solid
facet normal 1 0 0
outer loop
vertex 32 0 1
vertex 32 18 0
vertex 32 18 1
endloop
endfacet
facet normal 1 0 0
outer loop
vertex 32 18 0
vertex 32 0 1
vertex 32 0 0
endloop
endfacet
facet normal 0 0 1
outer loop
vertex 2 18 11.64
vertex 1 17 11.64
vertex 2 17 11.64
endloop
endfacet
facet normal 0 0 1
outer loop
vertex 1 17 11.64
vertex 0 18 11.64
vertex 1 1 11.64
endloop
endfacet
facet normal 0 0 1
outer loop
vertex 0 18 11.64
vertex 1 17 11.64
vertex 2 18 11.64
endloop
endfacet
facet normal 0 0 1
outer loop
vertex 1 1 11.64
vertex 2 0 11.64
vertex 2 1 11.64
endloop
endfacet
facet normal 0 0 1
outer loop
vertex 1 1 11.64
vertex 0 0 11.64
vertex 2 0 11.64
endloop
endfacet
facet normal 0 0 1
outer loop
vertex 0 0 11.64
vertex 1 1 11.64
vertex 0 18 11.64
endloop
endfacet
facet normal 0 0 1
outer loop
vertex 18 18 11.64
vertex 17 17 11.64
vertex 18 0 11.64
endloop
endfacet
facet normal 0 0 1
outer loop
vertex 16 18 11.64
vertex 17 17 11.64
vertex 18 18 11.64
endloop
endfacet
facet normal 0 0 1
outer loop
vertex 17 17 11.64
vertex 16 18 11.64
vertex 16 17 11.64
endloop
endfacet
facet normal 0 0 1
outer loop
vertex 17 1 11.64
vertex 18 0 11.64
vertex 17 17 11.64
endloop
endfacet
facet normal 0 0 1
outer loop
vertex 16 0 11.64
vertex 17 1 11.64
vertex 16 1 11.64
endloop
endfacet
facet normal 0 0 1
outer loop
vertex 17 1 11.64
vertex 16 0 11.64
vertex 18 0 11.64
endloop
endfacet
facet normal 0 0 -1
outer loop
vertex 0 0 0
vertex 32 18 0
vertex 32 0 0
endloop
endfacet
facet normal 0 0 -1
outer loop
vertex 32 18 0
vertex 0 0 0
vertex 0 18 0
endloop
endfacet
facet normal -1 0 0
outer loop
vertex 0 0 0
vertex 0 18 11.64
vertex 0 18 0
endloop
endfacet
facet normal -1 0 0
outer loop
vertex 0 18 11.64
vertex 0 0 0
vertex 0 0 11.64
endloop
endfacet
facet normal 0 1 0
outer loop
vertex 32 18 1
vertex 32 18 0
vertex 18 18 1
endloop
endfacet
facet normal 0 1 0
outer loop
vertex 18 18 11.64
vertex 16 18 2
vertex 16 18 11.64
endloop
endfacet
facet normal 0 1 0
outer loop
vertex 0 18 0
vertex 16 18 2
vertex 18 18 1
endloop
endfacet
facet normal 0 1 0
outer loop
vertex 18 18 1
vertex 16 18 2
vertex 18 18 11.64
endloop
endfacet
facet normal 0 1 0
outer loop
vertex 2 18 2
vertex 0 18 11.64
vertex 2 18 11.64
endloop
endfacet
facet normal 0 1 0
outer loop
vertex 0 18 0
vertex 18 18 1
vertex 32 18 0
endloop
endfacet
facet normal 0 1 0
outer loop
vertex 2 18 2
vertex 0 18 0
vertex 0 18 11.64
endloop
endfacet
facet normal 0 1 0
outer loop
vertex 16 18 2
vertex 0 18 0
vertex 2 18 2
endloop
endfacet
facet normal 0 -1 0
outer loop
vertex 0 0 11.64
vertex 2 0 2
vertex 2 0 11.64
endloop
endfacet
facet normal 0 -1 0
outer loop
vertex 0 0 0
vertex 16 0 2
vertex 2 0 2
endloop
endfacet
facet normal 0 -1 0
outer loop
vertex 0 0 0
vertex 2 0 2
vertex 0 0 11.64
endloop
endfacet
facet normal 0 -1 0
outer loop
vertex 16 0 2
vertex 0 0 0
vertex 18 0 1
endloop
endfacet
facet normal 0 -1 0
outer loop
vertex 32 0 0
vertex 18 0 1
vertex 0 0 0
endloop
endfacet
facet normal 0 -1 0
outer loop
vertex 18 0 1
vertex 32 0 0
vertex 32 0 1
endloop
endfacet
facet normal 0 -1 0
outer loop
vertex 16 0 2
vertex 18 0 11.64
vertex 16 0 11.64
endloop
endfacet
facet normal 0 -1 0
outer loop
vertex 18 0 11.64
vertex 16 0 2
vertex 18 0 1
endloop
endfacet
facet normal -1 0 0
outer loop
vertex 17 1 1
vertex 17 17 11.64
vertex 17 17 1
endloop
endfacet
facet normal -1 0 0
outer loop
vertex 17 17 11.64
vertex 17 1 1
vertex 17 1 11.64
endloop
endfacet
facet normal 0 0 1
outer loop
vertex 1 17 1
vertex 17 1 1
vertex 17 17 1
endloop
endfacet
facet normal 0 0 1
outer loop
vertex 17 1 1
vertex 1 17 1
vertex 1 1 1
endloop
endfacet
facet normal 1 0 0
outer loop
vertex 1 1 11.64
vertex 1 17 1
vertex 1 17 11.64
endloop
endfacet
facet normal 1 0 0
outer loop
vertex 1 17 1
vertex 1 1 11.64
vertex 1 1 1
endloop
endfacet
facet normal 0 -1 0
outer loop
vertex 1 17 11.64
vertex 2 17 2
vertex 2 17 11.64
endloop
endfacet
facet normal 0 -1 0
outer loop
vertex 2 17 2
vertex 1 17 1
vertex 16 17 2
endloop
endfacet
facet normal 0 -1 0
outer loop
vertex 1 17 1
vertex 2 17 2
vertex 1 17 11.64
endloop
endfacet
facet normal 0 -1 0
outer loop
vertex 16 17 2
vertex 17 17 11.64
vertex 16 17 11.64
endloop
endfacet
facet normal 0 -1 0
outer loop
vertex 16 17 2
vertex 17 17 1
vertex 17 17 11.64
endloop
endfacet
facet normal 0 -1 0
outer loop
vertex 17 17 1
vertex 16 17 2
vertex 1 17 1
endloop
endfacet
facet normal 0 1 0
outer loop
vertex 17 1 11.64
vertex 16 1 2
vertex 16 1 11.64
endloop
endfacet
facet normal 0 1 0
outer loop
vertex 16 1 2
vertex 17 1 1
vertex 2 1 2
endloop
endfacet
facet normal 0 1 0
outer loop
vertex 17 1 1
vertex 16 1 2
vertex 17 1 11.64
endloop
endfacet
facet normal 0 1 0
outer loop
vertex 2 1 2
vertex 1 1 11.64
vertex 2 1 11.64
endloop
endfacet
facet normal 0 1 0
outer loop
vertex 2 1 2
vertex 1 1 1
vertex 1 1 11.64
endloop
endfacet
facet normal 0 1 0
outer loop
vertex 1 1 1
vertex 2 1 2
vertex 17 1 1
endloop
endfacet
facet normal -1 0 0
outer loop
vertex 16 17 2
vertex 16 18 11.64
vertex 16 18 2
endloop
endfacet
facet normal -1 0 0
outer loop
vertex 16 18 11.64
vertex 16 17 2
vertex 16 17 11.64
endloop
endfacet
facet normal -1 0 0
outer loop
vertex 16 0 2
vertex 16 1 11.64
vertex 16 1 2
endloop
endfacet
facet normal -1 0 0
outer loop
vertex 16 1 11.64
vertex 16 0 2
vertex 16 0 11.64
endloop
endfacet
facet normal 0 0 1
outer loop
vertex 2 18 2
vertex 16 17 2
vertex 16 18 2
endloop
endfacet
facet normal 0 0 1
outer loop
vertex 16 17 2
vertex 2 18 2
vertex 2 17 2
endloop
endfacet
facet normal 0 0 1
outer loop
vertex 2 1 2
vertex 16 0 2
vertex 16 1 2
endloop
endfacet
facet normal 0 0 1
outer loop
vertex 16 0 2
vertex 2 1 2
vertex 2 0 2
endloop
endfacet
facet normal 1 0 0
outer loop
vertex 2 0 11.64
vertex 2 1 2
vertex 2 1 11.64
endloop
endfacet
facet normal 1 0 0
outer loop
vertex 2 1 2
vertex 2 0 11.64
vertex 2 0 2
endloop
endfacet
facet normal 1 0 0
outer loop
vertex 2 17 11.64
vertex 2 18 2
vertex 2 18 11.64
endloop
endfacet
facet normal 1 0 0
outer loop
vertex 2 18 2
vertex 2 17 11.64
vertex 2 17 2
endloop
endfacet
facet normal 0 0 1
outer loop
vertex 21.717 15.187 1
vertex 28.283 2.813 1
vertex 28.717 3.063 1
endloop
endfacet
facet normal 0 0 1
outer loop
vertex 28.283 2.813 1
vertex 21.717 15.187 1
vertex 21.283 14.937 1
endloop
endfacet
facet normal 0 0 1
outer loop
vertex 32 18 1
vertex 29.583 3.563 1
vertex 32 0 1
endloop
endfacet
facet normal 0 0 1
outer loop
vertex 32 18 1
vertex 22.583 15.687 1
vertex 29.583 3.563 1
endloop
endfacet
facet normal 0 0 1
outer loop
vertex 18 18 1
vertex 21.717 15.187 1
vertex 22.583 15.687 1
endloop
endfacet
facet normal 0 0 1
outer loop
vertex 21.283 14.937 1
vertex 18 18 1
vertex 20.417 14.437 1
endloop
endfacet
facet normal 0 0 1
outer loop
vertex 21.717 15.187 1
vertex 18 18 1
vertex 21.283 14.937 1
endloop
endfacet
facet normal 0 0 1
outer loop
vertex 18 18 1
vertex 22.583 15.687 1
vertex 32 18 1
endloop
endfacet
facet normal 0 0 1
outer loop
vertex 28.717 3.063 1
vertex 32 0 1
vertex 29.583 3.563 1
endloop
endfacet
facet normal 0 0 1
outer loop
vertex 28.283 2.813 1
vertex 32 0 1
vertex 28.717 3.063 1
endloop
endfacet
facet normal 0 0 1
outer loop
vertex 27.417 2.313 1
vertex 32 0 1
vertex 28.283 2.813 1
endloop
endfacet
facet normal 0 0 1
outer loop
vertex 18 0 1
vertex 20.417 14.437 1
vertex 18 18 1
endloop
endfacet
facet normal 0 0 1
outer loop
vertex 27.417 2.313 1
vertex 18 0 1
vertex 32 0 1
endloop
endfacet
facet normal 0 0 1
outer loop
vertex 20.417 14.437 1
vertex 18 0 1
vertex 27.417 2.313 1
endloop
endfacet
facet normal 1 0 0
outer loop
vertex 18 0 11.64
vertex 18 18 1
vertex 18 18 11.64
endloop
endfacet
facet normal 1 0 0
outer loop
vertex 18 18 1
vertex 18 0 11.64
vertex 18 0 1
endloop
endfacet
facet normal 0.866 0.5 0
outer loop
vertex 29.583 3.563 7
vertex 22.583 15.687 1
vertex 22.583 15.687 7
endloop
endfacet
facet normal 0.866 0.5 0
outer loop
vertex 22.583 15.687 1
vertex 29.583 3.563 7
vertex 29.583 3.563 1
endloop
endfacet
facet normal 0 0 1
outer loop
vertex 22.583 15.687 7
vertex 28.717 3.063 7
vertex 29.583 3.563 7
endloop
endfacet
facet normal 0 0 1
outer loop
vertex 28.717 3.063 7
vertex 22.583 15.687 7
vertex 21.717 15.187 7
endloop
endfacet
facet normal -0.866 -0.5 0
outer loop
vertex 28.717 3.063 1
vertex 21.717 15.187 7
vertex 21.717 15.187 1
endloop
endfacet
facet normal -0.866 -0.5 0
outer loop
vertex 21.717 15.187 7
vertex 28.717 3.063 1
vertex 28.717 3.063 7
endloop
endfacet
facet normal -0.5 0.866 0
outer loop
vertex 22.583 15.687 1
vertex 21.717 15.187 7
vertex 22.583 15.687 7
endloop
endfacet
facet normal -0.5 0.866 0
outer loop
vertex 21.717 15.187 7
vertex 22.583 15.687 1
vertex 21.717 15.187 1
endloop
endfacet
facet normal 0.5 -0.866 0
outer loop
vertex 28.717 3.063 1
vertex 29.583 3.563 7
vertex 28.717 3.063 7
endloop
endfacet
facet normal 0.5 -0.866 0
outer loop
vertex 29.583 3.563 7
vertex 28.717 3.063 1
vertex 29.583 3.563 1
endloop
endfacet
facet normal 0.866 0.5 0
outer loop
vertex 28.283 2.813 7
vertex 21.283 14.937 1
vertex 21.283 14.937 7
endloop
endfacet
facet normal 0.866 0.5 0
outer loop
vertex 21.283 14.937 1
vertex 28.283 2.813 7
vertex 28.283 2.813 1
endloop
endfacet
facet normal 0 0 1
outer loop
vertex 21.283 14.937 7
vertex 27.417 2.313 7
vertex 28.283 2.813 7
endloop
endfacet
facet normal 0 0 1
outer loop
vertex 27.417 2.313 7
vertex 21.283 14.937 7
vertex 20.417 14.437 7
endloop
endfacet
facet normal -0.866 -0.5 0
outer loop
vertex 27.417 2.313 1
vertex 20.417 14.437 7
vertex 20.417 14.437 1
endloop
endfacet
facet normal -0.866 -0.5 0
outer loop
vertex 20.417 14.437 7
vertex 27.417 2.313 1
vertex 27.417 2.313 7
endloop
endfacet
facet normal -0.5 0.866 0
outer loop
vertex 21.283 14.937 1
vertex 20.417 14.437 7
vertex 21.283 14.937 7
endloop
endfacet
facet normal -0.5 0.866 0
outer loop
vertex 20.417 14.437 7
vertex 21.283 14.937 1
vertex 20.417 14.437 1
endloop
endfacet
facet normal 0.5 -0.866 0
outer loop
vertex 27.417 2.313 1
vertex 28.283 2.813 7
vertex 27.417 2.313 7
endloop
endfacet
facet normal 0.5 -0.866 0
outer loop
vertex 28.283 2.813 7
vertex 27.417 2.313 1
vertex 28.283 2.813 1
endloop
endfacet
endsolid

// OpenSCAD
size_cube = 16 ;

t = 1;

cubesFactor = 2;

size_x = 2*size_cube;
size_y = size_cube+2*t;
size_z = size_cube*(1+0.33)/cubesFactor+t;

holder_x = 1;
holder_y = 14;
holder_z = 6;
angle = 30;
distance = 0.5;

module hull() {
    difference() {
        cube([size_x, size_y, size_z]);
        translate([t, t, t]) cube([size_cube, size_cube, size_z]);
        translate([2*t, 0, 2*t]) cube([size_cube-2*t, size_y, size_z]);
        translate([2*t+size_cube, 0, t]) cube([size_x, size_y, size_z]);
    }
}

module holder() {
    rotate([0, 0, angle]) {
        union() {
            translate([(holder_x+distance)/2, 0, 0]) cube([holder_x, holder_y, holder_z], true);
            translate([-(holder_x+distance)/2, 0, 0]) cube([holder_x, holder_y, holder_z], true);
        }
    }
}

hull();
translate([size_x*3/4+t, size_y/2, t+3]) holder();
